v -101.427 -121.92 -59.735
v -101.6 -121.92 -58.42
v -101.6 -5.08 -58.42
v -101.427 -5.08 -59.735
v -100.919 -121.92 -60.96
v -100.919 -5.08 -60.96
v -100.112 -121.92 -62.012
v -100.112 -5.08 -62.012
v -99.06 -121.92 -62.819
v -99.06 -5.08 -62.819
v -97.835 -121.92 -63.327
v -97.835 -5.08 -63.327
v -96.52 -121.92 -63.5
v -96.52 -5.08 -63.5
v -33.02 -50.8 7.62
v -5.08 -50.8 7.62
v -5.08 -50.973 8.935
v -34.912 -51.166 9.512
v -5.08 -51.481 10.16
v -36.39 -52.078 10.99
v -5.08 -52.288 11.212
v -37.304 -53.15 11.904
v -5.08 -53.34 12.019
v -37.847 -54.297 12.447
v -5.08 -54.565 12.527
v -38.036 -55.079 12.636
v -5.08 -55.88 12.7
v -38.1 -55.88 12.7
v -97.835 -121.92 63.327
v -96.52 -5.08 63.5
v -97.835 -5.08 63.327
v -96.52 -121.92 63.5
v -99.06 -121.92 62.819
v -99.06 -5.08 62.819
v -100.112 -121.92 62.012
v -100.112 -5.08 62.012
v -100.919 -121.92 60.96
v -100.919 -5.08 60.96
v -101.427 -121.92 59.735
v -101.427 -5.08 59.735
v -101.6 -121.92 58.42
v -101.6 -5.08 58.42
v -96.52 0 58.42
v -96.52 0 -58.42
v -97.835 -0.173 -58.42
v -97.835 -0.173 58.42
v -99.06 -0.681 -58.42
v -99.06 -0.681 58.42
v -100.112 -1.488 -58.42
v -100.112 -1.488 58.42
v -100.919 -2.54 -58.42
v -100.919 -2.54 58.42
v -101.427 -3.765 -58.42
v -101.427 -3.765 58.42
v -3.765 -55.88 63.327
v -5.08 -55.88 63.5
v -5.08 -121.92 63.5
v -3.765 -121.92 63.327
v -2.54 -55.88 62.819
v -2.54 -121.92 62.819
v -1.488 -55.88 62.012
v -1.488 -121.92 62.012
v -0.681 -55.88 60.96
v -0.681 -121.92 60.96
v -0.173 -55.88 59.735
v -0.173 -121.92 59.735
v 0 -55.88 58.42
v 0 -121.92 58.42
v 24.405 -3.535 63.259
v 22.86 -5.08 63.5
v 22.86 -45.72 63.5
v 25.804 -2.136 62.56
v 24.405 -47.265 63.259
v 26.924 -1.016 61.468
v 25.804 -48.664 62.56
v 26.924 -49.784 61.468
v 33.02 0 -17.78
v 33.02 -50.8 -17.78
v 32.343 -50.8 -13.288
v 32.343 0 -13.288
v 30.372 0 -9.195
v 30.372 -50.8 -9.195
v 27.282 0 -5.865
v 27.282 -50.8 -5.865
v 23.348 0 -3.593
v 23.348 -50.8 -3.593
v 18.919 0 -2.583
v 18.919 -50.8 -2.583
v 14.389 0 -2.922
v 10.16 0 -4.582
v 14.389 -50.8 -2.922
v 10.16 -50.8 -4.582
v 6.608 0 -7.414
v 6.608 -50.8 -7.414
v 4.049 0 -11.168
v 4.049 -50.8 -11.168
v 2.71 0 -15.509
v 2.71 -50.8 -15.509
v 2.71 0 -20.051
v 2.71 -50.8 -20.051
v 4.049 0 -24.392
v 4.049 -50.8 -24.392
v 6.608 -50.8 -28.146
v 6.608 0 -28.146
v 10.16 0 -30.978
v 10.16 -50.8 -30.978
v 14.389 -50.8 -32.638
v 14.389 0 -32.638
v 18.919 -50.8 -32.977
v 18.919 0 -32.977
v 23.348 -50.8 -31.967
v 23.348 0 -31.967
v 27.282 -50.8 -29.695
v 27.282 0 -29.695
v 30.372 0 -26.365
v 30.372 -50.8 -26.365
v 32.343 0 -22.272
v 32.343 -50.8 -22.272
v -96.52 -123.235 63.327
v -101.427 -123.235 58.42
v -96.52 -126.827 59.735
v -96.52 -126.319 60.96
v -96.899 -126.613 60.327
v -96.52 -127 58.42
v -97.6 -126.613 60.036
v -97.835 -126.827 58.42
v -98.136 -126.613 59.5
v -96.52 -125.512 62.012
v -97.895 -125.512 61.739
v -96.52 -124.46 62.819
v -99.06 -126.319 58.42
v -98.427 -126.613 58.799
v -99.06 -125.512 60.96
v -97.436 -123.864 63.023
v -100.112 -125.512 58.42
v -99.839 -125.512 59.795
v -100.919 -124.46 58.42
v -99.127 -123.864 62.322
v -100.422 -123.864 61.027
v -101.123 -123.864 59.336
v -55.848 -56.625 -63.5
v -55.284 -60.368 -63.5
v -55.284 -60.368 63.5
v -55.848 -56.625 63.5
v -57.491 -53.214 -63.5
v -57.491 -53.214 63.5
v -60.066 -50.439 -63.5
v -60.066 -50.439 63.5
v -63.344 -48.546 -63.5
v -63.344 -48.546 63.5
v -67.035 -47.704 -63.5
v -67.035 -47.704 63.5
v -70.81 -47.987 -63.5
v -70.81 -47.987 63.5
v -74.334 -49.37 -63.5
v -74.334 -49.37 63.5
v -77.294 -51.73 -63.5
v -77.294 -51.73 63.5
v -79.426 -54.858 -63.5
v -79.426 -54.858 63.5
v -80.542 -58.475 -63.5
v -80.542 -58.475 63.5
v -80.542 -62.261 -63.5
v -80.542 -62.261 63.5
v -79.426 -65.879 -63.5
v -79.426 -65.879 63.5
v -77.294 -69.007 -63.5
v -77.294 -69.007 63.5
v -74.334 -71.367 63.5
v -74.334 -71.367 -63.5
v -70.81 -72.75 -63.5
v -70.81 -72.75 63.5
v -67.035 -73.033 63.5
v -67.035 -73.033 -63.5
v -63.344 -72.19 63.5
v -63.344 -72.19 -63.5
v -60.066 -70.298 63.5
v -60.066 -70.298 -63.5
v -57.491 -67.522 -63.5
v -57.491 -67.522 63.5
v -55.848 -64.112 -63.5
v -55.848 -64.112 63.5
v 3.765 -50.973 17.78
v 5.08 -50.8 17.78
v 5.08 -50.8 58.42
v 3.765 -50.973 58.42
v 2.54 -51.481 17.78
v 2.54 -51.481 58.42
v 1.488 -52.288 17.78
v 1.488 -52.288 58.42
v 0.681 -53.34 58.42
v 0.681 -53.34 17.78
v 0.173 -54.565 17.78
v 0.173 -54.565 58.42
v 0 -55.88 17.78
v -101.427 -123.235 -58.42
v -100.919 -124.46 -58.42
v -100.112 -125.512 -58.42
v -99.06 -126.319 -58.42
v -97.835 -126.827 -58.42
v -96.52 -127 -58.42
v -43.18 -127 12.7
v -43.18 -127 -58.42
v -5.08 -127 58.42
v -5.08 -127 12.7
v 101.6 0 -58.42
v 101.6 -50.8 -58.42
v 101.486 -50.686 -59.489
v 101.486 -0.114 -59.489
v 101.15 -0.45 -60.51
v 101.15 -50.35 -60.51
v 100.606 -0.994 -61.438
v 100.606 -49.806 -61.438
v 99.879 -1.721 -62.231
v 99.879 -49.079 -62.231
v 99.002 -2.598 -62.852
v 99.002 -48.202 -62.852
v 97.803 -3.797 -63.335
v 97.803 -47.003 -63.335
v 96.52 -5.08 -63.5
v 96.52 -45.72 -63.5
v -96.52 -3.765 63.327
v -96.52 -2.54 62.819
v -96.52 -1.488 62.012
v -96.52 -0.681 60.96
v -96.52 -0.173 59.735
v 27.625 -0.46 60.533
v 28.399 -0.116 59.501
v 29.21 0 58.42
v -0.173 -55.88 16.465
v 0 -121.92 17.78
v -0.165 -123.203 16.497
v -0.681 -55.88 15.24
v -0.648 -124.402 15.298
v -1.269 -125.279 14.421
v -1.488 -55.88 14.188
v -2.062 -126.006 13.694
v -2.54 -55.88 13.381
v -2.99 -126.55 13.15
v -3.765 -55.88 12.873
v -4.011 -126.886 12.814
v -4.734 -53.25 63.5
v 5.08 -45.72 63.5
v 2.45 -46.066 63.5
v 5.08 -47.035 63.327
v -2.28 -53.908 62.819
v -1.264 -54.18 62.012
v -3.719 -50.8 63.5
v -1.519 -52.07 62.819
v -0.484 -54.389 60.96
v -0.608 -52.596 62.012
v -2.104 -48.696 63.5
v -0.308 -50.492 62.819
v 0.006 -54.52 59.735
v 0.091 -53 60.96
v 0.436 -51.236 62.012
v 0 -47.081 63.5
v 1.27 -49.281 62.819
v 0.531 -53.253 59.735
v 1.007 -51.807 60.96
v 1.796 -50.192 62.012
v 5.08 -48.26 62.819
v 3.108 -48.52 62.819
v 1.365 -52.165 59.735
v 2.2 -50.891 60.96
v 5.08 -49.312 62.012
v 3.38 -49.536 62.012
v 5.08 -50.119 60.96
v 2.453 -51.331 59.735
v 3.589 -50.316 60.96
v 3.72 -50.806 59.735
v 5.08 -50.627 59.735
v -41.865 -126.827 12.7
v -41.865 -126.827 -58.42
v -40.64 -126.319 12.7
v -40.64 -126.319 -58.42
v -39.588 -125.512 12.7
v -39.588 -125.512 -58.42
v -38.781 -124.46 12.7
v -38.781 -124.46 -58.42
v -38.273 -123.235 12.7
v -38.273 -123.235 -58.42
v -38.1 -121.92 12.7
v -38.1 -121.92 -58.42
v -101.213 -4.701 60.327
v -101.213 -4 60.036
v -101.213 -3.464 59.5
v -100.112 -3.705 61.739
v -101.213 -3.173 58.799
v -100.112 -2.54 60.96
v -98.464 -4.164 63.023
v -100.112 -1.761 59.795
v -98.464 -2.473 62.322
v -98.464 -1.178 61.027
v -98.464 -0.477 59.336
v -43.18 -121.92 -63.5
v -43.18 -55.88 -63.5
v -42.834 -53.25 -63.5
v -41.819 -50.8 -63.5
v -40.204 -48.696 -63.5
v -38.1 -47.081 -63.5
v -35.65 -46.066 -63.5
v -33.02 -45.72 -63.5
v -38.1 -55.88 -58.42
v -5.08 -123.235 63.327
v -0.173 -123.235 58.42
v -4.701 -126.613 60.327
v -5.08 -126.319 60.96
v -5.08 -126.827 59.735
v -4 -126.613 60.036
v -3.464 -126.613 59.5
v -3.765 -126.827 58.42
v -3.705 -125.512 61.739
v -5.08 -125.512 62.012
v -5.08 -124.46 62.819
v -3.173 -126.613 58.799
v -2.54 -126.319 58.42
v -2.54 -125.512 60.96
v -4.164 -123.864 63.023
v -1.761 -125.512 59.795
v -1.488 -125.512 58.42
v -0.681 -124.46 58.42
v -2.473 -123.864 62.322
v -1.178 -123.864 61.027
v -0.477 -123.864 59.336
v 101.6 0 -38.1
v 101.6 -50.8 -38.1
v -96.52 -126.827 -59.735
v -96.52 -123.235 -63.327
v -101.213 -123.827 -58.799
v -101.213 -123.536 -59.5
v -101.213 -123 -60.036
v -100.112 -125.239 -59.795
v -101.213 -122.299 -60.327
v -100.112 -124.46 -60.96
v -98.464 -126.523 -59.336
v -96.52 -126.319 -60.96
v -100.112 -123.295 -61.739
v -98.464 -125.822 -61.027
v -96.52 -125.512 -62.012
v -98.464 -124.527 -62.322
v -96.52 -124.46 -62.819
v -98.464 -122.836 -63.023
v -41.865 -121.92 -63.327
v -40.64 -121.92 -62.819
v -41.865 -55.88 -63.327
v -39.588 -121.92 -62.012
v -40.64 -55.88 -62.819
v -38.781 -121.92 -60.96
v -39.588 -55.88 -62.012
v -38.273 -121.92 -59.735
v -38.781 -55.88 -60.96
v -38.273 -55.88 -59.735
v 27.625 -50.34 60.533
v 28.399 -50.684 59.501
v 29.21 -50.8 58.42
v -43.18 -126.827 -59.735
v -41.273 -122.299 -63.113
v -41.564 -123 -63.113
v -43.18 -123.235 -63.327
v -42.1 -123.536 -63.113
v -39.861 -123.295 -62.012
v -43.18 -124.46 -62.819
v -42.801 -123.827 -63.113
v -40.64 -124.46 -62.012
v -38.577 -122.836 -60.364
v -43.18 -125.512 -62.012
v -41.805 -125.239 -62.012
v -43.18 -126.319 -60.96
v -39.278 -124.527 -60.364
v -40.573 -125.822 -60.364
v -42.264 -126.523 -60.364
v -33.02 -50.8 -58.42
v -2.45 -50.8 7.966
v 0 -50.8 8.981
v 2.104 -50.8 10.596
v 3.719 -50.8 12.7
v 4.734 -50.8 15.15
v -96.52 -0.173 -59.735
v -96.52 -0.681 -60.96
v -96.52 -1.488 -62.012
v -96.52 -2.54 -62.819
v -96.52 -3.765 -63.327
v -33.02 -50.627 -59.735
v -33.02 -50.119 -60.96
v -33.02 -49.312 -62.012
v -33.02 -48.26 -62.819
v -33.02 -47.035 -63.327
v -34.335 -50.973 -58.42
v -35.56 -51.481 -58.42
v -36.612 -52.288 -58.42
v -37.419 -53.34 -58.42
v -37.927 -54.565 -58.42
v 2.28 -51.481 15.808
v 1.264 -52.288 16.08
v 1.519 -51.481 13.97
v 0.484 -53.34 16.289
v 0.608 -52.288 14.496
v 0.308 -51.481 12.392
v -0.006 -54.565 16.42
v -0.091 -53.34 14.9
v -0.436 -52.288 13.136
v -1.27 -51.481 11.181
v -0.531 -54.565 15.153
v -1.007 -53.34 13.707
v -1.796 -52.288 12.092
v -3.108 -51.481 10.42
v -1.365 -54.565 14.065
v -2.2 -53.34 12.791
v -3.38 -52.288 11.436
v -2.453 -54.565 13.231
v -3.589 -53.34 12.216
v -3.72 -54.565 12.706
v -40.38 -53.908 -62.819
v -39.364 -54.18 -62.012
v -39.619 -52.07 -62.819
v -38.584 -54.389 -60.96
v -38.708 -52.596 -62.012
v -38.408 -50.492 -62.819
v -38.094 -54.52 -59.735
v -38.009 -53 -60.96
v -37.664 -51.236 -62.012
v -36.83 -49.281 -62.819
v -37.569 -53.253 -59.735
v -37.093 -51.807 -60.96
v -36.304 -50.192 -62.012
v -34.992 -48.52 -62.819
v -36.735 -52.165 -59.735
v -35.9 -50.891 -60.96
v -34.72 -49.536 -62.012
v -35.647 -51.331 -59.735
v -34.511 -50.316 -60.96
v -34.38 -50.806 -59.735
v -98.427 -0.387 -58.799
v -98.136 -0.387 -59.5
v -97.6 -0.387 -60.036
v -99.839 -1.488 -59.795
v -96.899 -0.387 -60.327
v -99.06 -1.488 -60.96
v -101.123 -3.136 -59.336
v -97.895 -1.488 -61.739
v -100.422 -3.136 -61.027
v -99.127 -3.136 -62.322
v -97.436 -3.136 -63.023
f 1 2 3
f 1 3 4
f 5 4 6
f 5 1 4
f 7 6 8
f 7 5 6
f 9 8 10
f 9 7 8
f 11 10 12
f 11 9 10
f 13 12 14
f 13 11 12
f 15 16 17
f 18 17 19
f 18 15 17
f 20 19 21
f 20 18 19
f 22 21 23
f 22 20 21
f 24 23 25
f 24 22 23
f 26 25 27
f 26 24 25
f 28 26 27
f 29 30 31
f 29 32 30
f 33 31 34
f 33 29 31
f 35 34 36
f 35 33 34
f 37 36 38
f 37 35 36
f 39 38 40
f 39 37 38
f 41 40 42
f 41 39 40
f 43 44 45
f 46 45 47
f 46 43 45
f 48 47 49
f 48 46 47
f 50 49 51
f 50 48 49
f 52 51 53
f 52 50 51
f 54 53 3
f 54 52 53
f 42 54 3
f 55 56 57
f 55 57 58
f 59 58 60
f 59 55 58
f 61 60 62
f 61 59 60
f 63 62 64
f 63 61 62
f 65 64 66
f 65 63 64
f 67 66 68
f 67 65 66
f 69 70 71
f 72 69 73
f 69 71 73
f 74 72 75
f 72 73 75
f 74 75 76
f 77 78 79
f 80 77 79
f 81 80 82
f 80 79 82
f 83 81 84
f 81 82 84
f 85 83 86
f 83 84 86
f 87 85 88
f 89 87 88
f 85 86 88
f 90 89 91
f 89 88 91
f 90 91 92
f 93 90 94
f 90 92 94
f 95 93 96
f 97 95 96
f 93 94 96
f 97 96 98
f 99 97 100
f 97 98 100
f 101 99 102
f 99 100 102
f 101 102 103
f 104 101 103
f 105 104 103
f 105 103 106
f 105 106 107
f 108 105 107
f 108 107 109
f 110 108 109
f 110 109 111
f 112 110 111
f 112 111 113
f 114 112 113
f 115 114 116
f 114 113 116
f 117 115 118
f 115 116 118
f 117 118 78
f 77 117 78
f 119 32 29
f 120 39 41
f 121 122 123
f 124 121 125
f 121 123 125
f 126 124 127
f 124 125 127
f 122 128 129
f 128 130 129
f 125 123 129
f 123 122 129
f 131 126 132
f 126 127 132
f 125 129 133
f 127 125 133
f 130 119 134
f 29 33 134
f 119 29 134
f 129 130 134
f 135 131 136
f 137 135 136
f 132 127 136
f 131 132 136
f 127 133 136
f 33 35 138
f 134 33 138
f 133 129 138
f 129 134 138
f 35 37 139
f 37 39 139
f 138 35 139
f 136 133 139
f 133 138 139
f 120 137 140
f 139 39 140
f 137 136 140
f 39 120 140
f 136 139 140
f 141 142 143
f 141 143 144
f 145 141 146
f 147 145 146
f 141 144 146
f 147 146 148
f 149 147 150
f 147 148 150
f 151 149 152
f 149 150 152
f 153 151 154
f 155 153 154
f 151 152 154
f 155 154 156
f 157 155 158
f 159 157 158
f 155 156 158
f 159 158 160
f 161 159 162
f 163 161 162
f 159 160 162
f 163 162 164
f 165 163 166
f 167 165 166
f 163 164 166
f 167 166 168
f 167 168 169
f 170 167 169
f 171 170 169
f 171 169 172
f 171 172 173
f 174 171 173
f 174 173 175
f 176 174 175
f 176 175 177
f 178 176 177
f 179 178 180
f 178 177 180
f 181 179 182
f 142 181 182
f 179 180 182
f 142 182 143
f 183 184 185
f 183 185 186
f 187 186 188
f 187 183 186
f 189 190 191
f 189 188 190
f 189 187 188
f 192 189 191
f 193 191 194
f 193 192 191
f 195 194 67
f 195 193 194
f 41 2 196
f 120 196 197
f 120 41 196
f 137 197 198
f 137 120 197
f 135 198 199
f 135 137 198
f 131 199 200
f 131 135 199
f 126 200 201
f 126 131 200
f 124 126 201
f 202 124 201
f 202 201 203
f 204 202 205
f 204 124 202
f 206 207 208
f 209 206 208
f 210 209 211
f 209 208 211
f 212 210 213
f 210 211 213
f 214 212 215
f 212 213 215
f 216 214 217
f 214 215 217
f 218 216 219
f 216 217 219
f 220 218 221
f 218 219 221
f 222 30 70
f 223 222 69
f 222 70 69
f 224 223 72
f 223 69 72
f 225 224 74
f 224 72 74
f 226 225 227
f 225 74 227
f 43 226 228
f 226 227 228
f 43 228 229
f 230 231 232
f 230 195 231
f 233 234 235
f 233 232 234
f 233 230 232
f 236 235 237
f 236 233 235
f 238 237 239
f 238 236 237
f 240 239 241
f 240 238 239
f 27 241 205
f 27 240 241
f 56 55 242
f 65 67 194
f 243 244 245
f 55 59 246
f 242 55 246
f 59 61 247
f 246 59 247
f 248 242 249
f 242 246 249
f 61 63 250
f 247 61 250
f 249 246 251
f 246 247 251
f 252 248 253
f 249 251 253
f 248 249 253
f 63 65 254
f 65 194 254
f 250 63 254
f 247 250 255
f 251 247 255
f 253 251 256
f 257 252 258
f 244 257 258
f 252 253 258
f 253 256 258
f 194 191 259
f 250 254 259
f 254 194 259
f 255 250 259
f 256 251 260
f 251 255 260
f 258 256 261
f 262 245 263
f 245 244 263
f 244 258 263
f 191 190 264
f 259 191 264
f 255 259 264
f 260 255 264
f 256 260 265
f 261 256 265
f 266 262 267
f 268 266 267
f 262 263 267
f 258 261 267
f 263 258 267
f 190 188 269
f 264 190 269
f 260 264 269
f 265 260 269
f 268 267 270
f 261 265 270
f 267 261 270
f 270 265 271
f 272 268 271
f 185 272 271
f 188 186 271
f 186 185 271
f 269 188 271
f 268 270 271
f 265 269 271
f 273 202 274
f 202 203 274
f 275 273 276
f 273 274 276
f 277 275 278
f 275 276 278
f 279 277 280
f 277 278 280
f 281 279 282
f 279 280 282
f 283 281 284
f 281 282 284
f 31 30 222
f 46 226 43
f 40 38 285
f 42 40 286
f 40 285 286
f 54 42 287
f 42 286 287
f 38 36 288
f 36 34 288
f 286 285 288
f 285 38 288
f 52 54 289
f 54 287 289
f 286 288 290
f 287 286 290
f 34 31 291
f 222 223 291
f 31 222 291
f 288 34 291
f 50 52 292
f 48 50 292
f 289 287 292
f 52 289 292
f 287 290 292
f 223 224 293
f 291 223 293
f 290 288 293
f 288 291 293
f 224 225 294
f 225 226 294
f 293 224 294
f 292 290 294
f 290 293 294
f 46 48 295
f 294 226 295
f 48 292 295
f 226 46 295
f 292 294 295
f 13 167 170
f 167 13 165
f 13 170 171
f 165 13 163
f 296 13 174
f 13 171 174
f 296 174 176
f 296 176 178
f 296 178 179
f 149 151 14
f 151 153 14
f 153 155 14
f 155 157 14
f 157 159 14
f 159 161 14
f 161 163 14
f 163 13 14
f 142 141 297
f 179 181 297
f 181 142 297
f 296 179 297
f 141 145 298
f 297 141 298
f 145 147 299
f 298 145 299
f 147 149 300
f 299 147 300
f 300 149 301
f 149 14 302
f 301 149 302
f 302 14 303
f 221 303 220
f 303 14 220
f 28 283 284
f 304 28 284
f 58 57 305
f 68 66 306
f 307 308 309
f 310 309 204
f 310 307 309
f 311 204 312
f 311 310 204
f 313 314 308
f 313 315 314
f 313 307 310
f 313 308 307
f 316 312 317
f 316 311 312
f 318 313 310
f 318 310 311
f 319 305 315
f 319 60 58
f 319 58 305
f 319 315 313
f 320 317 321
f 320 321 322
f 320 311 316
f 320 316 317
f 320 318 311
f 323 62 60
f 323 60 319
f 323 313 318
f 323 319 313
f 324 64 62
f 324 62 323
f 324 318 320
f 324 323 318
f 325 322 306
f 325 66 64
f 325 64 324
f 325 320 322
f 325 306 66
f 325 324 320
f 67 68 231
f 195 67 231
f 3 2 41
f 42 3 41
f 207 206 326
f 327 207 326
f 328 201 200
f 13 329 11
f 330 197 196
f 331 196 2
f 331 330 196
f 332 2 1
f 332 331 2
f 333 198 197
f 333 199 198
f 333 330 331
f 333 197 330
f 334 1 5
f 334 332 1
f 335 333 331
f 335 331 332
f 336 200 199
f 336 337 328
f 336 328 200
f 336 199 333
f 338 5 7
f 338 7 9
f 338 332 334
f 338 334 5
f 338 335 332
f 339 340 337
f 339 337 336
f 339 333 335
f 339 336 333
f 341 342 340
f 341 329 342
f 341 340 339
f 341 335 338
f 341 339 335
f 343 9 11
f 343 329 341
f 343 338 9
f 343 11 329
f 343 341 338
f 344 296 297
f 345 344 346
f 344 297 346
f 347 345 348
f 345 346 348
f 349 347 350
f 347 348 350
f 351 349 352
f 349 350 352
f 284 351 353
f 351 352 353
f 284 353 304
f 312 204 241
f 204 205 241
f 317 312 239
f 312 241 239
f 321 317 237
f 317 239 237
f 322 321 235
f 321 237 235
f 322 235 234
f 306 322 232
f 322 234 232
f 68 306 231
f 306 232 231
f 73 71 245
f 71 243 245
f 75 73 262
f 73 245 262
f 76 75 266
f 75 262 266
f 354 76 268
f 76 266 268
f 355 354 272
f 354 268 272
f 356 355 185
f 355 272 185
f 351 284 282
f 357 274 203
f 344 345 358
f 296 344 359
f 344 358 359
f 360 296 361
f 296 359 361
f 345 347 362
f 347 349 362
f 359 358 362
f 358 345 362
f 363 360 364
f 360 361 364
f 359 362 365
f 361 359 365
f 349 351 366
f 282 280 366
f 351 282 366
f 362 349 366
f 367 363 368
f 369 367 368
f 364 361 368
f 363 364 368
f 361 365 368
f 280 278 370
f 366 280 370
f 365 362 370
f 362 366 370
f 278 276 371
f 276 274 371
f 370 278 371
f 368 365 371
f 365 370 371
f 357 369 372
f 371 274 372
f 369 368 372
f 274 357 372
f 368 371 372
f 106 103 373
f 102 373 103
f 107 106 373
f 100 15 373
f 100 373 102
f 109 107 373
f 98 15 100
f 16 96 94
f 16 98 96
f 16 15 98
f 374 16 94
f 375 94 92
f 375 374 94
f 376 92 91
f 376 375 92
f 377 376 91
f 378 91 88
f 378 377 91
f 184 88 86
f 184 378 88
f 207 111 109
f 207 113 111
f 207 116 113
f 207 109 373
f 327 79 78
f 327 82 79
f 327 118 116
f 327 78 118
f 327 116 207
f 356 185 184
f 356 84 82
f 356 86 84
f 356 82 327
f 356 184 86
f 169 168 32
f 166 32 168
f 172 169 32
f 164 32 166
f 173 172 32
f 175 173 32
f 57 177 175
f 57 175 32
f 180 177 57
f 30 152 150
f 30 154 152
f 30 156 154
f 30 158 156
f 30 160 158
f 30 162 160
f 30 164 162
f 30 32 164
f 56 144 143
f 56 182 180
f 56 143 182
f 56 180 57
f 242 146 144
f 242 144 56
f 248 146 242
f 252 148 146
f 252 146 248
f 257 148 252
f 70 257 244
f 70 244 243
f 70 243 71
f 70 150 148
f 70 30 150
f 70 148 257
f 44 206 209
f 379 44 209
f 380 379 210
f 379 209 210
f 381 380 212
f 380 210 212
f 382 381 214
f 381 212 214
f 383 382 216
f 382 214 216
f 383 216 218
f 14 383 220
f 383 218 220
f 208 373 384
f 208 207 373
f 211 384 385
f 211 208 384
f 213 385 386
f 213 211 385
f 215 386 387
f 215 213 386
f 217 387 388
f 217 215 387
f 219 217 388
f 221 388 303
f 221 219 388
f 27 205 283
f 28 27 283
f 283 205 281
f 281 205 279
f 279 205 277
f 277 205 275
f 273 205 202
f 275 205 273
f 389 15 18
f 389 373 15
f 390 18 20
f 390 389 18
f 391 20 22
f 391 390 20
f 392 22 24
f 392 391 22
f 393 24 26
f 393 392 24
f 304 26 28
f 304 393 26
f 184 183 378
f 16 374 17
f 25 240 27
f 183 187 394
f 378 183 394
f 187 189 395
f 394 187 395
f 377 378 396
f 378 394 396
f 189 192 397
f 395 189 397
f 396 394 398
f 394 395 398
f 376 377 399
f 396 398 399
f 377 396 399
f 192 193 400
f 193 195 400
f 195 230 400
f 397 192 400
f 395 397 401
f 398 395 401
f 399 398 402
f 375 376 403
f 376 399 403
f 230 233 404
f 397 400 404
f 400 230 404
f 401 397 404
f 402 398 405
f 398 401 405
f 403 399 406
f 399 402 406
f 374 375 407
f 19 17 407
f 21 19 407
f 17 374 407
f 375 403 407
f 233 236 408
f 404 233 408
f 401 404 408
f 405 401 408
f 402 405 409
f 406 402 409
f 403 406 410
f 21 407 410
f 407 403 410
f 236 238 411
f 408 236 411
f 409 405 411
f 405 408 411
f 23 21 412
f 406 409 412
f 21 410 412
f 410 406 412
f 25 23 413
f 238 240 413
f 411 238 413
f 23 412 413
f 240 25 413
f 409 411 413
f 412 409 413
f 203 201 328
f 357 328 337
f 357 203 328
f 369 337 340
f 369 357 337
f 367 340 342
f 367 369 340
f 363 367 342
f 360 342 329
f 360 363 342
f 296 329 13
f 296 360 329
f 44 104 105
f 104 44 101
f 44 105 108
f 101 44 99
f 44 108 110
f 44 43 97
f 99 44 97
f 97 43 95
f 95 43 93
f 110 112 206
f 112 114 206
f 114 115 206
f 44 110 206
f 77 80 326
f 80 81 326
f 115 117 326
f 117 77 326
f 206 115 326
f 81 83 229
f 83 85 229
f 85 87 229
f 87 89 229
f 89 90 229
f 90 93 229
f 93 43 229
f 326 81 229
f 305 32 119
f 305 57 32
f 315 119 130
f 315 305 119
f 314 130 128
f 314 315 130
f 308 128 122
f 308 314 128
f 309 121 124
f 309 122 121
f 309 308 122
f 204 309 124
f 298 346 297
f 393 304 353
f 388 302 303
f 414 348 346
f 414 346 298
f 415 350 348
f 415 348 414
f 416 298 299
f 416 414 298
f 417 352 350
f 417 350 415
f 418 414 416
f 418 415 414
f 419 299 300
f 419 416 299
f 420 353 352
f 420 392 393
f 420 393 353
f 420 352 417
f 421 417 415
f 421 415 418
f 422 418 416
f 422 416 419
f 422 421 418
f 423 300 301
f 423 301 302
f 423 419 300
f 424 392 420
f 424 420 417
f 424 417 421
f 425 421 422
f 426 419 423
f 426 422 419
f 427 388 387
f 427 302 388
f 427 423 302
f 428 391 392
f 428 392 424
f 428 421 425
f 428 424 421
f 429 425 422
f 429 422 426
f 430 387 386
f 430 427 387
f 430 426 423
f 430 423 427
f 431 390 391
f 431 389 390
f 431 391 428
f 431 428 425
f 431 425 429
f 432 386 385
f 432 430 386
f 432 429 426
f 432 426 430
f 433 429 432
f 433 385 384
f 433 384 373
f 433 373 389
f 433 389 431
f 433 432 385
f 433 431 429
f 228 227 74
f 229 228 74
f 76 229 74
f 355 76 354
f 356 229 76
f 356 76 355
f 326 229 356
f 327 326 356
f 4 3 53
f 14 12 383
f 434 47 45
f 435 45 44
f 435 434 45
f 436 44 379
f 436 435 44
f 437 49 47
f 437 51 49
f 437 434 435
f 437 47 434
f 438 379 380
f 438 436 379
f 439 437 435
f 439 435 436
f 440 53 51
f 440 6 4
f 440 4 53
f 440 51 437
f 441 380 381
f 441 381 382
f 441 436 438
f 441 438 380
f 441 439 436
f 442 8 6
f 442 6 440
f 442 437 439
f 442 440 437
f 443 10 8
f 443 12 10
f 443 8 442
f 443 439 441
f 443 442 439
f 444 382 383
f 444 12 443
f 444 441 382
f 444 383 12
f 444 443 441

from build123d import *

# Parameters (mm, degrees)
F0_W     = 203.2
F0_H     = 127
F1_DEPTH = 127
F3_DEPTH = 76.2
F4_SIZE2 = 101.6
F4_SIZE  = 76.2
F5_R     = 5.08
F6_R     = 15.24
F7_DEPTH = 50.8
F8_R     = 12.7
F9_DEPTH = 127


with BuildPart() as f1:
    # F0 (on Front) → F1 (new body)
    with BuildSketch(Plane.XZ):
        Rectangle(F0_W, F0_H)
    extrude(amount=F1_DEPTH)

    # F2 (on face) → F3 (cut)
    with BuildSketch(Plane.XZ.offset(127)):
        Polygon((101.6, 63.5), (0, 63.5), (0, 12.7), (-38.1, 12.7), (-38.1, -63.5), (101.6, -63.5), align=None)
    extrude(amount=-F3_DEPTH, mode=Mode.SUBTRACT)

    # F4
    f4_edges = [f1.edges().sort_by_distance(p)[0] for p in [
        (101.6, -25.4, 63.5),
    ]]
    f4_side = f1.faces().sort_by_distance((-21.771429, -52.614286, 63.5))[0]
    chamfer(f4_edges, length=F4_SIZE, length2=F4_SIZE2, reference=f4_side)

    # F5
    f5_edges = [f1.edges().sort_by_distance(p)[0] for p in [
        (0, -88.9, 63.5),
        (12.7, -50.8, 63.5),
        (25.4, -25.4, 63.5),
        (-38.1, 0, 63.5),
        (-101.6, -63.5, 63.5),
        (-50.8, -127, 63.5),
        (0, -127, 38.1),
        (0, -88.9, 12.7),
        (0, -50.8, 38.1),
        (-38.1, -50.8, -25.4),
        (-38.1, -127, -25.4),
        (-38.1, -88.9, -63.5),
        (-69.85, -127, -63.5),
        (-101.6, -127, 0),
        (31.75, -50.8, -63.5),
        (101.6, -25.4, -63.5),
        (-101.6, -63.5, -63.5),
        (-101.6, 0, 0),
        (0, 0, -63.5),
        (-19.05, -50.8, 12.7),
    ]]
    fillet(f5_edges, radius=F5_R)

    # F6 (on face) → F7 (cut, through all)
    with BuildSketch(Plane.XZ.offset(50.8)):
        with Locations((17.78, -17.78)):
            Circle(F6_R)
    extrude(amount=-F7_DEPTH, mode=Mode.SUBTRACT)

    # F8 (on face) → F9 (cut, through all)
    with BuildSketch(Plane.XY.offset(63.5)):
        with Locations((-67.9840967059, -60.368321836)):
            Circle(F8_R)
    extrude(amount=-F9_DEPTH, mode=Mode.SUBTRACT)


solid = f1.part
